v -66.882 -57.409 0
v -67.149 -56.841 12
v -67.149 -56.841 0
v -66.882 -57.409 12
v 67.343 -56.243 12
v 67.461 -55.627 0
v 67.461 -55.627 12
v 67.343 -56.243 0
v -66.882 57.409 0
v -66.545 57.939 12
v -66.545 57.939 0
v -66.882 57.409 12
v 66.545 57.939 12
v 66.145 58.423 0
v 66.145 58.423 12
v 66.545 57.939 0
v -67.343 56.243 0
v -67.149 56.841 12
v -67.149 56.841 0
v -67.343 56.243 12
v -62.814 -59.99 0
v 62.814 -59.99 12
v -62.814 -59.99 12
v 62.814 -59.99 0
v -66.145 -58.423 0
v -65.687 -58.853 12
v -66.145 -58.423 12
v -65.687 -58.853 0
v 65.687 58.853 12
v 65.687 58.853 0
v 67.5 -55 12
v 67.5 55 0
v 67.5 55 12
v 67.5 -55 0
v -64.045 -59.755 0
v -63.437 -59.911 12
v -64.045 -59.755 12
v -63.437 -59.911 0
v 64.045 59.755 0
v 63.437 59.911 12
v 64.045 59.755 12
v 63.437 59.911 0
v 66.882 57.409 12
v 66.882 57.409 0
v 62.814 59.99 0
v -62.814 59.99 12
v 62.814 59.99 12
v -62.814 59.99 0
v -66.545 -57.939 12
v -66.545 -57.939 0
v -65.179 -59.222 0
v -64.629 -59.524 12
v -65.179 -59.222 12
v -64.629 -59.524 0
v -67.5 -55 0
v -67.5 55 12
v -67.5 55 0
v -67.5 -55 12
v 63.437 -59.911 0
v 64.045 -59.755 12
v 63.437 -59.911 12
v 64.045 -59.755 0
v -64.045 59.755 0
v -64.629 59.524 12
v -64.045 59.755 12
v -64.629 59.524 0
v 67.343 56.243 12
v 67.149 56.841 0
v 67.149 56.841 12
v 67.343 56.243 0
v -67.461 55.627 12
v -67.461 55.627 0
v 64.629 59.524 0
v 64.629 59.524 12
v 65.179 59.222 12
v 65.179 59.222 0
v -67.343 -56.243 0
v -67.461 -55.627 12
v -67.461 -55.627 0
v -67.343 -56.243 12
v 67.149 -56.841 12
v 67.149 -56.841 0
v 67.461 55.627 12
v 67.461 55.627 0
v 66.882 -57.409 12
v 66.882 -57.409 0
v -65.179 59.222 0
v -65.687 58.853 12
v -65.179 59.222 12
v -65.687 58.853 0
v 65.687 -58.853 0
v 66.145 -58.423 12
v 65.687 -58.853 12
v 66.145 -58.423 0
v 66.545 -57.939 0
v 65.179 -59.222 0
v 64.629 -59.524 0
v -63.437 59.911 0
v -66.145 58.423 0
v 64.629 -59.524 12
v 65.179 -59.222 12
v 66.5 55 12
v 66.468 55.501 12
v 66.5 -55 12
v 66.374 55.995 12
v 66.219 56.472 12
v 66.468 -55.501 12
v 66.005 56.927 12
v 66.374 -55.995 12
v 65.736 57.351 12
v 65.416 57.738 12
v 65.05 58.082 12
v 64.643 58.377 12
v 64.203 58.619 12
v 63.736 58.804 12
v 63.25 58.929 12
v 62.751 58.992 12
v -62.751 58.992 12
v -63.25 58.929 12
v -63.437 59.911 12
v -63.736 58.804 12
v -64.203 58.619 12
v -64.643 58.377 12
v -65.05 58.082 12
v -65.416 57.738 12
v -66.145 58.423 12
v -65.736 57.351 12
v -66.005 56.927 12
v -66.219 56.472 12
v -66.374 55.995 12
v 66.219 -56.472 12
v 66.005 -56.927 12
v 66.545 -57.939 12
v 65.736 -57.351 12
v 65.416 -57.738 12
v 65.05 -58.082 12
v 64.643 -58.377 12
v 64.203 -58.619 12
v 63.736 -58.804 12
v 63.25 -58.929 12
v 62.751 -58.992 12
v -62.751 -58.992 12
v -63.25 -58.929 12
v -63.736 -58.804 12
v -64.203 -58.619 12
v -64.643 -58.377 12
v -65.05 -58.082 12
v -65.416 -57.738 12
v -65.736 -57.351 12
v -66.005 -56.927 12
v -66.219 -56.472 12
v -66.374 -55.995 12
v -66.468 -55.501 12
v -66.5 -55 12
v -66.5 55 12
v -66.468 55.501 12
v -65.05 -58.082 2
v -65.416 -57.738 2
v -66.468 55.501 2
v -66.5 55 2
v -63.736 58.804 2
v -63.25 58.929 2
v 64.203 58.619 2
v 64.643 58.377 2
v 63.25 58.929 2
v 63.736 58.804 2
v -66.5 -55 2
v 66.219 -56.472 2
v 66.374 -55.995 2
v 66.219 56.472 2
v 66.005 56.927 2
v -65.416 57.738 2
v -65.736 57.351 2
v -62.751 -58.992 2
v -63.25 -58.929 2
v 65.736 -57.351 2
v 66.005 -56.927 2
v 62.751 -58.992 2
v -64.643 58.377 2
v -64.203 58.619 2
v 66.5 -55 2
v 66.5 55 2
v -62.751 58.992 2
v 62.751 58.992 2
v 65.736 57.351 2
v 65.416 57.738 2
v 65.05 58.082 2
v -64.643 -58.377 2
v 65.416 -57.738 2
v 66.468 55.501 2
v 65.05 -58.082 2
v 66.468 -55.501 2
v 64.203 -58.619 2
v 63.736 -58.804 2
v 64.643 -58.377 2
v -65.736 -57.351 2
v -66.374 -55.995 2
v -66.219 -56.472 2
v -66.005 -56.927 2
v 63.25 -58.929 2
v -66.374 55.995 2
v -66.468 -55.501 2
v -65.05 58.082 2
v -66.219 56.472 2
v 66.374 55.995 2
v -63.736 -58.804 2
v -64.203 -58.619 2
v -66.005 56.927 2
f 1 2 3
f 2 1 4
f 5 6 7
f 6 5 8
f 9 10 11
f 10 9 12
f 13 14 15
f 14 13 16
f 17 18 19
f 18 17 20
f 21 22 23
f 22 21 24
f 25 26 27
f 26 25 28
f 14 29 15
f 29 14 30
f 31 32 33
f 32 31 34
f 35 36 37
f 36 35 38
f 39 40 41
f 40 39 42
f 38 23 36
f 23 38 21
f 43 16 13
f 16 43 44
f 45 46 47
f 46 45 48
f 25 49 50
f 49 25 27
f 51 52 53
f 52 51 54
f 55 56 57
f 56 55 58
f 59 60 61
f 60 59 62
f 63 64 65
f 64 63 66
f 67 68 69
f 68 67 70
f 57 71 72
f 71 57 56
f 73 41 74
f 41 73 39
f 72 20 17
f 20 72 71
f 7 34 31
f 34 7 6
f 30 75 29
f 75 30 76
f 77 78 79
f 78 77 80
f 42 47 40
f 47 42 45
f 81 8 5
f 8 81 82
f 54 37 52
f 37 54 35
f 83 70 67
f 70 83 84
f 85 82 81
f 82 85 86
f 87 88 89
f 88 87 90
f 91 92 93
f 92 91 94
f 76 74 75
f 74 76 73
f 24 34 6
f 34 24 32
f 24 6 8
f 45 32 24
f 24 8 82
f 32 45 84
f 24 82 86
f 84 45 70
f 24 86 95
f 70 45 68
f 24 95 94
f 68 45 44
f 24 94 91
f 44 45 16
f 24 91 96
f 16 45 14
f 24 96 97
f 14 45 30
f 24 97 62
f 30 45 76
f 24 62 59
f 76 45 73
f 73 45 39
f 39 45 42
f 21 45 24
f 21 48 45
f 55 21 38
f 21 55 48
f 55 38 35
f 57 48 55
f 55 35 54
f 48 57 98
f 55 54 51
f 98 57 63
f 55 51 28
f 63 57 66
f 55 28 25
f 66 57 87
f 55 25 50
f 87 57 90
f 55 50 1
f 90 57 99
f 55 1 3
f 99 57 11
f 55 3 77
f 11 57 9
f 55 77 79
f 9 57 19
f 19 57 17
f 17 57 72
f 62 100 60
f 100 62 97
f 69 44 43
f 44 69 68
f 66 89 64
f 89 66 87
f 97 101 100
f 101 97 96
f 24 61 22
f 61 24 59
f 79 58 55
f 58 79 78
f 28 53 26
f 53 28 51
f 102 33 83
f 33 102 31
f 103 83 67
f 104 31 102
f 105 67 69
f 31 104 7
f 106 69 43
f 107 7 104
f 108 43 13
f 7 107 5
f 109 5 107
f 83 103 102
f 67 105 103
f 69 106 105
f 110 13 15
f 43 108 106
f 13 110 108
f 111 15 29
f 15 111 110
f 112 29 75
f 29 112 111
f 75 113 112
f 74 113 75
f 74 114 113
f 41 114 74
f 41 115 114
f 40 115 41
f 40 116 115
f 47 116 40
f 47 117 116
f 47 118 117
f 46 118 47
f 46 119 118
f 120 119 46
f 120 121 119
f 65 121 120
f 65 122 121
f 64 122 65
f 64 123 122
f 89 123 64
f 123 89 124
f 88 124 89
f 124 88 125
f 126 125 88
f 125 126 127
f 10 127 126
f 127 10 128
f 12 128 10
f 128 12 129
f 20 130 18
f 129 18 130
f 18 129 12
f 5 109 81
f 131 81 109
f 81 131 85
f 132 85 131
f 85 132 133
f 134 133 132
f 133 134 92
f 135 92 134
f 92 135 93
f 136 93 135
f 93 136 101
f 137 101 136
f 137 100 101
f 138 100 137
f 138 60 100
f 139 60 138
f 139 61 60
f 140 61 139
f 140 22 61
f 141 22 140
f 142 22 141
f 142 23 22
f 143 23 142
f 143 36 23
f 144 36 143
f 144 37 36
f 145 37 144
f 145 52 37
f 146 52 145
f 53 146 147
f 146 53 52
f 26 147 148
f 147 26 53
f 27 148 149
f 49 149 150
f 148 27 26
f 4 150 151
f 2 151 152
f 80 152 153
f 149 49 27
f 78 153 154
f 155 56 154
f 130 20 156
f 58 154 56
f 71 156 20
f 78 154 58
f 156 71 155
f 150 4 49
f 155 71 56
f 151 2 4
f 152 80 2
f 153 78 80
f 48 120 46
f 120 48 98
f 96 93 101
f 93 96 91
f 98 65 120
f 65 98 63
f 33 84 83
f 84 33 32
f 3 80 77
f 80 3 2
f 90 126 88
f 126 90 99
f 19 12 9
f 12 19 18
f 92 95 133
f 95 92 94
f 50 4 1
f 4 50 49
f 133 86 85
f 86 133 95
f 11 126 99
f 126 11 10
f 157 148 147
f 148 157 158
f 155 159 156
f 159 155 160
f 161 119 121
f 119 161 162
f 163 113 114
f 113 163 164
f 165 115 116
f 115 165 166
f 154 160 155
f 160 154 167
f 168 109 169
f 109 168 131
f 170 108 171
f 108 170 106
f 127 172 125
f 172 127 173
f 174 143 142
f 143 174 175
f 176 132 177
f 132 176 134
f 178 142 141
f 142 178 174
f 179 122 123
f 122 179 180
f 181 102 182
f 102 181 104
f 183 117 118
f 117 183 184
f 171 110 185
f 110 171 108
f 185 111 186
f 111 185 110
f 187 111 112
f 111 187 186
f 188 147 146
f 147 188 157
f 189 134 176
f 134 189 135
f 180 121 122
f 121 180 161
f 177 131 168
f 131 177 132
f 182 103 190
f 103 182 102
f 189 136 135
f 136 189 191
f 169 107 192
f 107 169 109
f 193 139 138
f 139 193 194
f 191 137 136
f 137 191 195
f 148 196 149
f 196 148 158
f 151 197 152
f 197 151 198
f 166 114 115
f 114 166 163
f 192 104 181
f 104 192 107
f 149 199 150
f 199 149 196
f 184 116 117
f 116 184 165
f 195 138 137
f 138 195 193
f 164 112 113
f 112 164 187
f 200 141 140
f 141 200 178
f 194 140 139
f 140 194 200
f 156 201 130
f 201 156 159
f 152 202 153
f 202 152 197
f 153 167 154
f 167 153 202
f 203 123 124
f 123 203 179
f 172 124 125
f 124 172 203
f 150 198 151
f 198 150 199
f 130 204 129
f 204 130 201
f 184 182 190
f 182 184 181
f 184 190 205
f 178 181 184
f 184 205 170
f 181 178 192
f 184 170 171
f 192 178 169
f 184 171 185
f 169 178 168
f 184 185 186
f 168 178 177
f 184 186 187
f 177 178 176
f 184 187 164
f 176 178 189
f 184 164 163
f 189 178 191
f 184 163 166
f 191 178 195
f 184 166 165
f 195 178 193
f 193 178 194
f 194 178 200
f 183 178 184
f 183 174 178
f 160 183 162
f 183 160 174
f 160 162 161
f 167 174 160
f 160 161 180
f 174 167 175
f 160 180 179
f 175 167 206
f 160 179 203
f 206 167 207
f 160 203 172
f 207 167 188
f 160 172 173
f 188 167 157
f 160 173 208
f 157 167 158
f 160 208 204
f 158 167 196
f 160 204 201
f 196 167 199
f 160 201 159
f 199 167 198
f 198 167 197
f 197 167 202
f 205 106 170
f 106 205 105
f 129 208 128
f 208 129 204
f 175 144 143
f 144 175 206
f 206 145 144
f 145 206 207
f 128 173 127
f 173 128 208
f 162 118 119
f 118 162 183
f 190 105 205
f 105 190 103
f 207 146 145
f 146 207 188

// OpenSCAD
$fn = 50;


difference() {
	union() {
		hull() {
			translate(v = [-62.5000000000, 55.0000000000, 0]) {
				cylinder(h = 12, r = 5);
			}
			translate(v = [62.5000000000, 55.0000000000, 0]) {
				cylinder(h = 12, r = 5);
			}
			translate(v = [-62.5000000000, -55.0000000000, 0]) {
				cylinder(h = 12, r = 5);
			}
			translate(v = [62.5000000000, -55.0000000000, 0]) {
				cylinder(h = 12, r = 5);
			}
		}
	}
	union() {
		translate(v = [0, 0, 2]) {
			hull() {
				translate(v = [-62.5000000000, 55.0000000000, 0]) {
					cylinder(h = 10, r = 4);
				}
				translate(v = [62.5000000000, 55.0000000000, 0]) {
					cylinder(h = 10, r = 4);
				}
				translate(v = [-62.5000000000, -55.0000000000, 0]) {
					cylinder(h = 10, r = 4);
				}
				translate(v = [62.5000000000, -55.0000000000, 0]) {
					cylinder(h = 10, r = 4);
				}
			}
		}
	}
}
